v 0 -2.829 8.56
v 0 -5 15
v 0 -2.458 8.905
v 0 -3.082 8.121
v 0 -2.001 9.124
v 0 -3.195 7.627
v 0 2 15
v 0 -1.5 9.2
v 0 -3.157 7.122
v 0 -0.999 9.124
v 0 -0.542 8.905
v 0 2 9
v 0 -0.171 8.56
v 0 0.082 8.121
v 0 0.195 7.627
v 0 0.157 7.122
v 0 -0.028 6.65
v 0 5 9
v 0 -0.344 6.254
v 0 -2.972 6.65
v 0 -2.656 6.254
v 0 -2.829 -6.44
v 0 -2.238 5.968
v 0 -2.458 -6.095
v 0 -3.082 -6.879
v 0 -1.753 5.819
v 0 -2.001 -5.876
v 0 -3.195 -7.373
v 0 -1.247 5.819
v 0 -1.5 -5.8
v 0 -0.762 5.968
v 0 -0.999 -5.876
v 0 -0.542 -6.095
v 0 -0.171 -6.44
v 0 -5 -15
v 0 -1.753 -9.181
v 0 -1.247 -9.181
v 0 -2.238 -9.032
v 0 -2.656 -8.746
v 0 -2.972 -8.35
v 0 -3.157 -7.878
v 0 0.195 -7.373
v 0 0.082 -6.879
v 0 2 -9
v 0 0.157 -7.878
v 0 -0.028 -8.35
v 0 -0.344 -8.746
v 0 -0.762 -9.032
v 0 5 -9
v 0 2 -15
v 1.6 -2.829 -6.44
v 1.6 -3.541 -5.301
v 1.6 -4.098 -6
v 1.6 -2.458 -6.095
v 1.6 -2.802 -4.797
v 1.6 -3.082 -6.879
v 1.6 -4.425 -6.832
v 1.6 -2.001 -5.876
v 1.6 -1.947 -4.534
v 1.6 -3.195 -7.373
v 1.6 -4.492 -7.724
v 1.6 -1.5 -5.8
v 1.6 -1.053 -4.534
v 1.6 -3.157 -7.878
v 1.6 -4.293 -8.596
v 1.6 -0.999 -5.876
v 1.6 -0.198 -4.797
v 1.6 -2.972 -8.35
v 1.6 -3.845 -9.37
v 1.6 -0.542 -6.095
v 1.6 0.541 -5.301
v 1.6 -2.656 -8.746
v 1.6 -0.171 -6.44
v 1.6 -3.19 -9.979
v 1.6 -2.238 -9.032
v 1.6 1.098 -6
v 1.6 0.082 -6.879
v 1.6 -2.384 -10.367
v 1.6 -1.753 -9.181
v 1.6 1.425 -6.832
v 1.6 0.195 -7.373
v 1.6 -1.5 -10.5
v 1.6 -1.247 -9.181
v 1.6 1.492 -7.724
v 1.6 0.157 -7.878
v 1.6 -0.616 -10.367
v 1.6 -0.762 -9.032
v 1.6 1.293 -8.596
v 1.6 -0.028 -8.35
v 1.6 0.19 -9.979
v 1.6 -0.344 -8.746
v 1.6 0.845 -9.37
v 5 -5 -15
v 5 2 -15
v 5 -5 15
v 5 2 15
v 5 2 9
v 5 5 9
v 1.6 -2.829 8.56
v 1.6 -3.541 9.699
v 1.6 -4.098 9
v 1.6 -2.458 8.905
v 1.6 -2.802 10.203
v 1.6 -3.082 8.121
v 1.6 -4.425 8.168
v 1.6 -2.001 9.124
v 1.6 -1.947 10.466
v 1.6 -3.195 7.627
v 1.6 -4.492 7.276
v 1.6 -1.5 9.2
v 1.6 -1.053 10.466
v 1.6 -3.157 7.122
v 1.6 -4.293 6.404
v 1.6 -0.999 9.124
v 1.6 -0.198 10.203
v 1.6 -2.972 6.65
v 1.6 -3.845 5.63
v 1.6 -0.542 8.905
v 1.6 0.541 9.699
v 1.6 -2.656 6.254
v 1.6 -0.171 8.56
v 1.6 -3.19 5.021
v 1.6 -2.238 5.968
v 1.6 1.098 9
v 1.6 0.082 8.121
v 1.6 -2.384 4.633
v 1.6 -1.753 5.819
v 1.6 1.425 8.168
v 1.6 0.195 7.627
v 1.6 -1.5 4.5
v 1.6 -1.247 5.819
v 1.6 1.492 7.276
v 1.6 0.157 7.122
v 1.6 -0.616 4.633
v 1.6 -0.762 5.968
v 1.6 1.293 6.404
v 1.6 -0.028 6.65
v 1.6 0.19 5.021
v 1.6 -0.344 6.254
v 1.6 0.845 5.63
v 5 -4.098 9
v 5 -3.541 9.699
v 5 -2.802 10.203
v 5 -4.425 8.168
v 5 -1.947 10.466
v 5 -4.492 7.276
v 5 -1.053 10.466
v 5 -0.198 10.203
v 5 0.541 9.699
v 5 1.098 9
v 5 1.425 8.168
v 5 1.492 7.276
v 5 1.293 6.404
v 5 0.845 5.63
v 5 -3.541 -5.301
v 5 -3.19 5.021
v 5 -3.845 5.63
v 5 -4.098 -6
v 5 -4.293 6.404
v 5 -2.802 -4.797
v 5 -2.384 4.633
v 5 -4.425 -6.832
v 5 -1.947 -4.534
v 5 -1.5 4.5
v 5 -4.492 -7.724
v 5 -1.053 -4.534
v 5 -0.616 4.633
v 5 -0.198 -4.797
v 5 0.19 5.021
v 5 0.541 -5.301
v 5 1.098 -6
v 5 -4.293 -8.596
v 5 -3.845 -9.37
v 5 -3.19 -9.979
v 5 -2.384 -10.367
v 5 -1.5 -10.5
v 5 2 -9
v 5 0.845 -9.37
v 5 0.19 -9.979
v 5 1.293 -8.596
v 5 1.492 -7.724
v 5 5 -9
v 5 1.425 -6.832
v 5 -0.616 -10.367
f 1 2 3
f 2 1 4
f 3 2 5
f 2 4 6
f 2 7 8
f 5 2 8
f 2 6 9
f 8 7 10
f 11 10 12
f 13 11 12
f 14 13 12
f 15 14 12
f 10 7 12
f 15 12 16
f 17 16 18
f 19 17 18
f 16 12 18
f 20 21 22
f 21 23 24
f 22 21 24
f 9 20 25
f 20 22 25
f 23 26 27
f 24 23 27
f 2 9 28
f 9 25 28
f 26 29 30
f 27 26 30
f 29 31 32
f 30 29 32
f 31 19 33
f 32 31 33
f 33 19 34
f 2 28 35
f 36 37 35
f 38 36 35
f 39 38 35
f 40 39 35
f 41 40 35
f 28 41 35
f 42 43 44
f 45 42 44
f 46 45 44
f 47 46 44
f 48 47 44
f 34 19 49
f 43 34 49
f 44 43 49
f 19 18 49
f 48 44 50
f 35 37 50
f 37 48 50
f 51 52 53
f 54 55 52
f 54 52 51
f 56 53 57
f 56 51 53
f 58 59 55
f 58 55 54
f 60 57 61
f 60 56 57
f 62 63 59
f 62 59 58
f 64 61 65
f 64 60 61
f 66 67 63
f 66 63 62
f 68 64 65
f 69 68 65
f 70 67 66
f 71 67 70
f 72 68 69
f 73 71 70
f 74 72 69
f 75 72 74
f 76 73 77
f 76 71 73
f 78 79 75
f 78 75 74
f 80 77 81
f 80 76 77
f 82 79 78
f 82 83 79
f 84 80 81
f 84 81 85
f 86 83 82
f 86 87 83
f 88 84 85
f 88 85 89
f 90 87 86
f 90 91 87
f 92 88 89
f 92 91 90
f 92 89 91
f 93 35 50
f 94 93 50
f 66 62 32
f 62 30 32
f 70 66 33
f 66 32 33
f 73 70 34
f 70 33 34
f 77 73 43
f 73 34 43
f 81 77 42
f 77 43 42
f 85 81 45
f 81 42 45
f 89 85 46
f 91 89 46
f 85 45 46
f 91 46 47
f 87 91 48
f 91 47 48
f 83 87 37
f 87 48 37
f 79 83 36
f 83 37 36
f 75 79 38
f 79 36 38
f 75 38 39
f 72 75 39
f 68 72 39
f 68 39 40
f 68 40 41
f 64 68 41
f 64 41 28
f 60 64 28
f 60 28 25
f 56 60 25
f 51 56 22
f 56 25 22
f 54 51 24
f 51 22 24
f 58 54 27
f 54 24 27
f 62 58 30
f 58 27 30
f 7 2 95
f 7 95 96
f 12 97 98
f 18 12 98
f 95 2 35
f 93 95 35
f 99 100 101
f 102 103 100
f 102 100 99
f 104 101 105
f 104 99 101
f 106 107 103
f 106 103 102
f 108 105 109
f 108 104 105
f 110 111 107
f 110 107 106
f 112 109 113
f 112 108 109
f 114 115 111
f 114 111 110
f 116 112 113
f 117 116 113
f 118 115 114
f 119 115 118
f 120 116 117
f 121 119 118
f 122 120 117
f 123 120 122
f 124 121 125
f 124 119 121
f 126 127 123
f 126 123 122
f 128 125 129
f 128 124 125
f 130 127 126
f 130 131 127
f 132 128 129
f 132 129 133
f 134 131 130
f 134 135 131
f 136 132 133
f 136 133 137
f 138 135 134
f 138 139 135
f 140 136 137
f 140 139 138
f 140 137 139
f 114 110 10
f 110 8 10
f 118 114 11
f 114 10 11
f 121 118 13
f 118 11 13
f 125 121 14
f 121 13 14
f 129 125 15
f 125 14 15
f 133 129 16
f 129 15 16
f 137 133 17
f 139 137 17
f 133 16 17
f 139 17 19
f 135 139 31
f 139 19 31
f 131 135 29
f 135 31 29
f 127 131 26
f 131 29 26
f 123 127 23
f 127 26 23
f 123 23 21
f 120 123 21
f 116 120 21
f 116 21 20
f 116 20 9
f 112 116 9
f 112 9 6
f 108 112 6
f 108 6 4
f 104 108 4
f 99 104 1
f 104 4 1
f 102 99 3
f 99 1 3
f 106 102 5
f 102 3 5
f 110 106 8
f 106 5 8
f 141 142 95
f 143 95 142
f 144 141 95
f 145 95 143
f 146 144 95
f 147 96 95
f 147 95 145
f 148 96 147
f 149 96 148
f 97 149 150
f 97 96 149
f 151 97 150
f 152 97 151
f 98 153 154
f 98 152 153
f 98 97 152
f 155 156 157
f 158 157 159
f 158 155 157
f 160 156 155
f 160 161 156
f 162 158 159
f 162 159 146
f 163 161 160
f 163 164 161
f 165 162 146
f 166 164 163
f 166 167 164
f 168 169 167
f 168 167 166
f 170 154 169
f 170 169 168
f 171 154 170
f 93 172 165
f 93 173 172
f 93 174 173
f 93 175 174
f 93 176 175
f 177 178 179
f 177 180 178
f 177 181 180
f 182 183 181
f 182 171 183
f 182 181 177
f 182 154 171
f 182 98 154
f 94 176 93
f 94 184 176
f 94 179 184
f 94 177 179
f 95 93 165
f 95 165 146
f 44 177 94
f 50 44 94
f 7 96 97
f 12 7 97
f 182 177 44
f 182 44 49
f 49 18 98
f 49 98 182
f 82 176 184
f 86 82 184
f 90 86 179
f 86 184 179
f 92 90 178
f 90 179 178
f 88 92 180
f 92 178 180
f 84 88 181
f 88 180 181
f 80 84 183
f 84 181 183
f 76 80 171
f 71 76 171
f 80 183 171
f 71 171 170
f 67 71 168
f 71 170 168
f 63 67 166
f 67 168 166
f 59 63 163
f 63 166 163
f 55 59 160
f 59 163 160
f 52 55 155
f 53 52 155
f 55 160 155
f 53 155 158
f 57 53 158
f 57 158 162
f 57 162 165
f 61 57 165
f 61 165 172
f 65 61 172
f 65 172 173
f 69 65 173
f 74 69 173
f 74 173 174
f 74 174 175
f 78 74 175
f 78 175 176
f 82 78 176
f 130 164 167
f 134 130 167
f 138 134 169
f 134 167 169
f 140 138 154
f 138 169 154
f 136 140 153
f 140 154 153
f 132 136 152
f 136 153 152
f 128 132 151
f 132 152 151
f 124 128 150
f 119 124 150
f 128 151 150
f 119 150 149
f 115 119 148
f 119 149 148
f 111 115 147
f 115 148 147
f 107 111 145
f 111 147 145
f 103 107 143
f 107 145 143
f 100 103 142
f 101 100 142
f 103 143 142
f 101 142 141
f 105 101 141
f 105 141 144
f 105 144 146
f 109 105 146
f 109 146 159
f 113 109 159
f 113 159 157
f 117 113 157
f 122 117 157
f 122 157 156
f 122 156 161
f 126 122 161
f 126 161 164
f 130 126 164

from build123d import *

# Parameters (mm, degrees)
SKETCH_1_W                = 30
SKETCH_1_H                = 10
EXTRUDE_1_DEPTH           = 5
SKETCH_4_W                = 6
SKETCH_4_H                = 3
CUT_EXTRUDE_1_DEPTH       = 17.583123952
HOLE_WIZARD_1_D           = 3.4
HOLE_WIZARD_1_CBORE_D     = 6
HOLE_WIZARD_1_CBORE_DEPTH = 3.4


with BuildPart() as part:
    # 草图1 → 凸台-拉伸1 (new body)
    with BuildSketch(Plane(origin=(0, 0, 0), x_dir=(0, 0, -1), z_dir=(1, 0, 0))):
        Rectangle(SKETCH_1_W, SKETCH_1_H)
    extrude(amount=EXTRUDE_1_DEPTH)

    # 草图4 → 切除-拉伸1 (cut, through all)
    with BuildSketch(Plane(origin=(5, 0, 0), x_dir=(0, 0, -1), z_dir=(1, 0, 0))):
        with Locations((12, 3.5)):
            Rectangle(SKETCH_4_W, SKETCH_4_H)
        with Locations((-12, 3.5)):
            Rectangle(SKETCH_4_W, SKETCH_4_H)
    extrude(amount=-CUT_EXTRUDE_1_DEPTH, mode=Mode.SUBTRACT)

    # 打孔尺寸根据内六角圆柱头螺钉的类型1 (through all)
    with Locations(Plane(origin=(5, 0, 0), x_dir=(0, 0, -1), z_dir=(1, 0, 0))):
        with Locations((-7.5, -1.5), (7.5, -1.5)):
            CounterBoreHole(HOLE_WIZARD_1_D / 2, HOLE_WIZARD_1_CBORE_D / 2, HOLE_WIZARD_1_CBORE_DEPTH)


solid = part.part
